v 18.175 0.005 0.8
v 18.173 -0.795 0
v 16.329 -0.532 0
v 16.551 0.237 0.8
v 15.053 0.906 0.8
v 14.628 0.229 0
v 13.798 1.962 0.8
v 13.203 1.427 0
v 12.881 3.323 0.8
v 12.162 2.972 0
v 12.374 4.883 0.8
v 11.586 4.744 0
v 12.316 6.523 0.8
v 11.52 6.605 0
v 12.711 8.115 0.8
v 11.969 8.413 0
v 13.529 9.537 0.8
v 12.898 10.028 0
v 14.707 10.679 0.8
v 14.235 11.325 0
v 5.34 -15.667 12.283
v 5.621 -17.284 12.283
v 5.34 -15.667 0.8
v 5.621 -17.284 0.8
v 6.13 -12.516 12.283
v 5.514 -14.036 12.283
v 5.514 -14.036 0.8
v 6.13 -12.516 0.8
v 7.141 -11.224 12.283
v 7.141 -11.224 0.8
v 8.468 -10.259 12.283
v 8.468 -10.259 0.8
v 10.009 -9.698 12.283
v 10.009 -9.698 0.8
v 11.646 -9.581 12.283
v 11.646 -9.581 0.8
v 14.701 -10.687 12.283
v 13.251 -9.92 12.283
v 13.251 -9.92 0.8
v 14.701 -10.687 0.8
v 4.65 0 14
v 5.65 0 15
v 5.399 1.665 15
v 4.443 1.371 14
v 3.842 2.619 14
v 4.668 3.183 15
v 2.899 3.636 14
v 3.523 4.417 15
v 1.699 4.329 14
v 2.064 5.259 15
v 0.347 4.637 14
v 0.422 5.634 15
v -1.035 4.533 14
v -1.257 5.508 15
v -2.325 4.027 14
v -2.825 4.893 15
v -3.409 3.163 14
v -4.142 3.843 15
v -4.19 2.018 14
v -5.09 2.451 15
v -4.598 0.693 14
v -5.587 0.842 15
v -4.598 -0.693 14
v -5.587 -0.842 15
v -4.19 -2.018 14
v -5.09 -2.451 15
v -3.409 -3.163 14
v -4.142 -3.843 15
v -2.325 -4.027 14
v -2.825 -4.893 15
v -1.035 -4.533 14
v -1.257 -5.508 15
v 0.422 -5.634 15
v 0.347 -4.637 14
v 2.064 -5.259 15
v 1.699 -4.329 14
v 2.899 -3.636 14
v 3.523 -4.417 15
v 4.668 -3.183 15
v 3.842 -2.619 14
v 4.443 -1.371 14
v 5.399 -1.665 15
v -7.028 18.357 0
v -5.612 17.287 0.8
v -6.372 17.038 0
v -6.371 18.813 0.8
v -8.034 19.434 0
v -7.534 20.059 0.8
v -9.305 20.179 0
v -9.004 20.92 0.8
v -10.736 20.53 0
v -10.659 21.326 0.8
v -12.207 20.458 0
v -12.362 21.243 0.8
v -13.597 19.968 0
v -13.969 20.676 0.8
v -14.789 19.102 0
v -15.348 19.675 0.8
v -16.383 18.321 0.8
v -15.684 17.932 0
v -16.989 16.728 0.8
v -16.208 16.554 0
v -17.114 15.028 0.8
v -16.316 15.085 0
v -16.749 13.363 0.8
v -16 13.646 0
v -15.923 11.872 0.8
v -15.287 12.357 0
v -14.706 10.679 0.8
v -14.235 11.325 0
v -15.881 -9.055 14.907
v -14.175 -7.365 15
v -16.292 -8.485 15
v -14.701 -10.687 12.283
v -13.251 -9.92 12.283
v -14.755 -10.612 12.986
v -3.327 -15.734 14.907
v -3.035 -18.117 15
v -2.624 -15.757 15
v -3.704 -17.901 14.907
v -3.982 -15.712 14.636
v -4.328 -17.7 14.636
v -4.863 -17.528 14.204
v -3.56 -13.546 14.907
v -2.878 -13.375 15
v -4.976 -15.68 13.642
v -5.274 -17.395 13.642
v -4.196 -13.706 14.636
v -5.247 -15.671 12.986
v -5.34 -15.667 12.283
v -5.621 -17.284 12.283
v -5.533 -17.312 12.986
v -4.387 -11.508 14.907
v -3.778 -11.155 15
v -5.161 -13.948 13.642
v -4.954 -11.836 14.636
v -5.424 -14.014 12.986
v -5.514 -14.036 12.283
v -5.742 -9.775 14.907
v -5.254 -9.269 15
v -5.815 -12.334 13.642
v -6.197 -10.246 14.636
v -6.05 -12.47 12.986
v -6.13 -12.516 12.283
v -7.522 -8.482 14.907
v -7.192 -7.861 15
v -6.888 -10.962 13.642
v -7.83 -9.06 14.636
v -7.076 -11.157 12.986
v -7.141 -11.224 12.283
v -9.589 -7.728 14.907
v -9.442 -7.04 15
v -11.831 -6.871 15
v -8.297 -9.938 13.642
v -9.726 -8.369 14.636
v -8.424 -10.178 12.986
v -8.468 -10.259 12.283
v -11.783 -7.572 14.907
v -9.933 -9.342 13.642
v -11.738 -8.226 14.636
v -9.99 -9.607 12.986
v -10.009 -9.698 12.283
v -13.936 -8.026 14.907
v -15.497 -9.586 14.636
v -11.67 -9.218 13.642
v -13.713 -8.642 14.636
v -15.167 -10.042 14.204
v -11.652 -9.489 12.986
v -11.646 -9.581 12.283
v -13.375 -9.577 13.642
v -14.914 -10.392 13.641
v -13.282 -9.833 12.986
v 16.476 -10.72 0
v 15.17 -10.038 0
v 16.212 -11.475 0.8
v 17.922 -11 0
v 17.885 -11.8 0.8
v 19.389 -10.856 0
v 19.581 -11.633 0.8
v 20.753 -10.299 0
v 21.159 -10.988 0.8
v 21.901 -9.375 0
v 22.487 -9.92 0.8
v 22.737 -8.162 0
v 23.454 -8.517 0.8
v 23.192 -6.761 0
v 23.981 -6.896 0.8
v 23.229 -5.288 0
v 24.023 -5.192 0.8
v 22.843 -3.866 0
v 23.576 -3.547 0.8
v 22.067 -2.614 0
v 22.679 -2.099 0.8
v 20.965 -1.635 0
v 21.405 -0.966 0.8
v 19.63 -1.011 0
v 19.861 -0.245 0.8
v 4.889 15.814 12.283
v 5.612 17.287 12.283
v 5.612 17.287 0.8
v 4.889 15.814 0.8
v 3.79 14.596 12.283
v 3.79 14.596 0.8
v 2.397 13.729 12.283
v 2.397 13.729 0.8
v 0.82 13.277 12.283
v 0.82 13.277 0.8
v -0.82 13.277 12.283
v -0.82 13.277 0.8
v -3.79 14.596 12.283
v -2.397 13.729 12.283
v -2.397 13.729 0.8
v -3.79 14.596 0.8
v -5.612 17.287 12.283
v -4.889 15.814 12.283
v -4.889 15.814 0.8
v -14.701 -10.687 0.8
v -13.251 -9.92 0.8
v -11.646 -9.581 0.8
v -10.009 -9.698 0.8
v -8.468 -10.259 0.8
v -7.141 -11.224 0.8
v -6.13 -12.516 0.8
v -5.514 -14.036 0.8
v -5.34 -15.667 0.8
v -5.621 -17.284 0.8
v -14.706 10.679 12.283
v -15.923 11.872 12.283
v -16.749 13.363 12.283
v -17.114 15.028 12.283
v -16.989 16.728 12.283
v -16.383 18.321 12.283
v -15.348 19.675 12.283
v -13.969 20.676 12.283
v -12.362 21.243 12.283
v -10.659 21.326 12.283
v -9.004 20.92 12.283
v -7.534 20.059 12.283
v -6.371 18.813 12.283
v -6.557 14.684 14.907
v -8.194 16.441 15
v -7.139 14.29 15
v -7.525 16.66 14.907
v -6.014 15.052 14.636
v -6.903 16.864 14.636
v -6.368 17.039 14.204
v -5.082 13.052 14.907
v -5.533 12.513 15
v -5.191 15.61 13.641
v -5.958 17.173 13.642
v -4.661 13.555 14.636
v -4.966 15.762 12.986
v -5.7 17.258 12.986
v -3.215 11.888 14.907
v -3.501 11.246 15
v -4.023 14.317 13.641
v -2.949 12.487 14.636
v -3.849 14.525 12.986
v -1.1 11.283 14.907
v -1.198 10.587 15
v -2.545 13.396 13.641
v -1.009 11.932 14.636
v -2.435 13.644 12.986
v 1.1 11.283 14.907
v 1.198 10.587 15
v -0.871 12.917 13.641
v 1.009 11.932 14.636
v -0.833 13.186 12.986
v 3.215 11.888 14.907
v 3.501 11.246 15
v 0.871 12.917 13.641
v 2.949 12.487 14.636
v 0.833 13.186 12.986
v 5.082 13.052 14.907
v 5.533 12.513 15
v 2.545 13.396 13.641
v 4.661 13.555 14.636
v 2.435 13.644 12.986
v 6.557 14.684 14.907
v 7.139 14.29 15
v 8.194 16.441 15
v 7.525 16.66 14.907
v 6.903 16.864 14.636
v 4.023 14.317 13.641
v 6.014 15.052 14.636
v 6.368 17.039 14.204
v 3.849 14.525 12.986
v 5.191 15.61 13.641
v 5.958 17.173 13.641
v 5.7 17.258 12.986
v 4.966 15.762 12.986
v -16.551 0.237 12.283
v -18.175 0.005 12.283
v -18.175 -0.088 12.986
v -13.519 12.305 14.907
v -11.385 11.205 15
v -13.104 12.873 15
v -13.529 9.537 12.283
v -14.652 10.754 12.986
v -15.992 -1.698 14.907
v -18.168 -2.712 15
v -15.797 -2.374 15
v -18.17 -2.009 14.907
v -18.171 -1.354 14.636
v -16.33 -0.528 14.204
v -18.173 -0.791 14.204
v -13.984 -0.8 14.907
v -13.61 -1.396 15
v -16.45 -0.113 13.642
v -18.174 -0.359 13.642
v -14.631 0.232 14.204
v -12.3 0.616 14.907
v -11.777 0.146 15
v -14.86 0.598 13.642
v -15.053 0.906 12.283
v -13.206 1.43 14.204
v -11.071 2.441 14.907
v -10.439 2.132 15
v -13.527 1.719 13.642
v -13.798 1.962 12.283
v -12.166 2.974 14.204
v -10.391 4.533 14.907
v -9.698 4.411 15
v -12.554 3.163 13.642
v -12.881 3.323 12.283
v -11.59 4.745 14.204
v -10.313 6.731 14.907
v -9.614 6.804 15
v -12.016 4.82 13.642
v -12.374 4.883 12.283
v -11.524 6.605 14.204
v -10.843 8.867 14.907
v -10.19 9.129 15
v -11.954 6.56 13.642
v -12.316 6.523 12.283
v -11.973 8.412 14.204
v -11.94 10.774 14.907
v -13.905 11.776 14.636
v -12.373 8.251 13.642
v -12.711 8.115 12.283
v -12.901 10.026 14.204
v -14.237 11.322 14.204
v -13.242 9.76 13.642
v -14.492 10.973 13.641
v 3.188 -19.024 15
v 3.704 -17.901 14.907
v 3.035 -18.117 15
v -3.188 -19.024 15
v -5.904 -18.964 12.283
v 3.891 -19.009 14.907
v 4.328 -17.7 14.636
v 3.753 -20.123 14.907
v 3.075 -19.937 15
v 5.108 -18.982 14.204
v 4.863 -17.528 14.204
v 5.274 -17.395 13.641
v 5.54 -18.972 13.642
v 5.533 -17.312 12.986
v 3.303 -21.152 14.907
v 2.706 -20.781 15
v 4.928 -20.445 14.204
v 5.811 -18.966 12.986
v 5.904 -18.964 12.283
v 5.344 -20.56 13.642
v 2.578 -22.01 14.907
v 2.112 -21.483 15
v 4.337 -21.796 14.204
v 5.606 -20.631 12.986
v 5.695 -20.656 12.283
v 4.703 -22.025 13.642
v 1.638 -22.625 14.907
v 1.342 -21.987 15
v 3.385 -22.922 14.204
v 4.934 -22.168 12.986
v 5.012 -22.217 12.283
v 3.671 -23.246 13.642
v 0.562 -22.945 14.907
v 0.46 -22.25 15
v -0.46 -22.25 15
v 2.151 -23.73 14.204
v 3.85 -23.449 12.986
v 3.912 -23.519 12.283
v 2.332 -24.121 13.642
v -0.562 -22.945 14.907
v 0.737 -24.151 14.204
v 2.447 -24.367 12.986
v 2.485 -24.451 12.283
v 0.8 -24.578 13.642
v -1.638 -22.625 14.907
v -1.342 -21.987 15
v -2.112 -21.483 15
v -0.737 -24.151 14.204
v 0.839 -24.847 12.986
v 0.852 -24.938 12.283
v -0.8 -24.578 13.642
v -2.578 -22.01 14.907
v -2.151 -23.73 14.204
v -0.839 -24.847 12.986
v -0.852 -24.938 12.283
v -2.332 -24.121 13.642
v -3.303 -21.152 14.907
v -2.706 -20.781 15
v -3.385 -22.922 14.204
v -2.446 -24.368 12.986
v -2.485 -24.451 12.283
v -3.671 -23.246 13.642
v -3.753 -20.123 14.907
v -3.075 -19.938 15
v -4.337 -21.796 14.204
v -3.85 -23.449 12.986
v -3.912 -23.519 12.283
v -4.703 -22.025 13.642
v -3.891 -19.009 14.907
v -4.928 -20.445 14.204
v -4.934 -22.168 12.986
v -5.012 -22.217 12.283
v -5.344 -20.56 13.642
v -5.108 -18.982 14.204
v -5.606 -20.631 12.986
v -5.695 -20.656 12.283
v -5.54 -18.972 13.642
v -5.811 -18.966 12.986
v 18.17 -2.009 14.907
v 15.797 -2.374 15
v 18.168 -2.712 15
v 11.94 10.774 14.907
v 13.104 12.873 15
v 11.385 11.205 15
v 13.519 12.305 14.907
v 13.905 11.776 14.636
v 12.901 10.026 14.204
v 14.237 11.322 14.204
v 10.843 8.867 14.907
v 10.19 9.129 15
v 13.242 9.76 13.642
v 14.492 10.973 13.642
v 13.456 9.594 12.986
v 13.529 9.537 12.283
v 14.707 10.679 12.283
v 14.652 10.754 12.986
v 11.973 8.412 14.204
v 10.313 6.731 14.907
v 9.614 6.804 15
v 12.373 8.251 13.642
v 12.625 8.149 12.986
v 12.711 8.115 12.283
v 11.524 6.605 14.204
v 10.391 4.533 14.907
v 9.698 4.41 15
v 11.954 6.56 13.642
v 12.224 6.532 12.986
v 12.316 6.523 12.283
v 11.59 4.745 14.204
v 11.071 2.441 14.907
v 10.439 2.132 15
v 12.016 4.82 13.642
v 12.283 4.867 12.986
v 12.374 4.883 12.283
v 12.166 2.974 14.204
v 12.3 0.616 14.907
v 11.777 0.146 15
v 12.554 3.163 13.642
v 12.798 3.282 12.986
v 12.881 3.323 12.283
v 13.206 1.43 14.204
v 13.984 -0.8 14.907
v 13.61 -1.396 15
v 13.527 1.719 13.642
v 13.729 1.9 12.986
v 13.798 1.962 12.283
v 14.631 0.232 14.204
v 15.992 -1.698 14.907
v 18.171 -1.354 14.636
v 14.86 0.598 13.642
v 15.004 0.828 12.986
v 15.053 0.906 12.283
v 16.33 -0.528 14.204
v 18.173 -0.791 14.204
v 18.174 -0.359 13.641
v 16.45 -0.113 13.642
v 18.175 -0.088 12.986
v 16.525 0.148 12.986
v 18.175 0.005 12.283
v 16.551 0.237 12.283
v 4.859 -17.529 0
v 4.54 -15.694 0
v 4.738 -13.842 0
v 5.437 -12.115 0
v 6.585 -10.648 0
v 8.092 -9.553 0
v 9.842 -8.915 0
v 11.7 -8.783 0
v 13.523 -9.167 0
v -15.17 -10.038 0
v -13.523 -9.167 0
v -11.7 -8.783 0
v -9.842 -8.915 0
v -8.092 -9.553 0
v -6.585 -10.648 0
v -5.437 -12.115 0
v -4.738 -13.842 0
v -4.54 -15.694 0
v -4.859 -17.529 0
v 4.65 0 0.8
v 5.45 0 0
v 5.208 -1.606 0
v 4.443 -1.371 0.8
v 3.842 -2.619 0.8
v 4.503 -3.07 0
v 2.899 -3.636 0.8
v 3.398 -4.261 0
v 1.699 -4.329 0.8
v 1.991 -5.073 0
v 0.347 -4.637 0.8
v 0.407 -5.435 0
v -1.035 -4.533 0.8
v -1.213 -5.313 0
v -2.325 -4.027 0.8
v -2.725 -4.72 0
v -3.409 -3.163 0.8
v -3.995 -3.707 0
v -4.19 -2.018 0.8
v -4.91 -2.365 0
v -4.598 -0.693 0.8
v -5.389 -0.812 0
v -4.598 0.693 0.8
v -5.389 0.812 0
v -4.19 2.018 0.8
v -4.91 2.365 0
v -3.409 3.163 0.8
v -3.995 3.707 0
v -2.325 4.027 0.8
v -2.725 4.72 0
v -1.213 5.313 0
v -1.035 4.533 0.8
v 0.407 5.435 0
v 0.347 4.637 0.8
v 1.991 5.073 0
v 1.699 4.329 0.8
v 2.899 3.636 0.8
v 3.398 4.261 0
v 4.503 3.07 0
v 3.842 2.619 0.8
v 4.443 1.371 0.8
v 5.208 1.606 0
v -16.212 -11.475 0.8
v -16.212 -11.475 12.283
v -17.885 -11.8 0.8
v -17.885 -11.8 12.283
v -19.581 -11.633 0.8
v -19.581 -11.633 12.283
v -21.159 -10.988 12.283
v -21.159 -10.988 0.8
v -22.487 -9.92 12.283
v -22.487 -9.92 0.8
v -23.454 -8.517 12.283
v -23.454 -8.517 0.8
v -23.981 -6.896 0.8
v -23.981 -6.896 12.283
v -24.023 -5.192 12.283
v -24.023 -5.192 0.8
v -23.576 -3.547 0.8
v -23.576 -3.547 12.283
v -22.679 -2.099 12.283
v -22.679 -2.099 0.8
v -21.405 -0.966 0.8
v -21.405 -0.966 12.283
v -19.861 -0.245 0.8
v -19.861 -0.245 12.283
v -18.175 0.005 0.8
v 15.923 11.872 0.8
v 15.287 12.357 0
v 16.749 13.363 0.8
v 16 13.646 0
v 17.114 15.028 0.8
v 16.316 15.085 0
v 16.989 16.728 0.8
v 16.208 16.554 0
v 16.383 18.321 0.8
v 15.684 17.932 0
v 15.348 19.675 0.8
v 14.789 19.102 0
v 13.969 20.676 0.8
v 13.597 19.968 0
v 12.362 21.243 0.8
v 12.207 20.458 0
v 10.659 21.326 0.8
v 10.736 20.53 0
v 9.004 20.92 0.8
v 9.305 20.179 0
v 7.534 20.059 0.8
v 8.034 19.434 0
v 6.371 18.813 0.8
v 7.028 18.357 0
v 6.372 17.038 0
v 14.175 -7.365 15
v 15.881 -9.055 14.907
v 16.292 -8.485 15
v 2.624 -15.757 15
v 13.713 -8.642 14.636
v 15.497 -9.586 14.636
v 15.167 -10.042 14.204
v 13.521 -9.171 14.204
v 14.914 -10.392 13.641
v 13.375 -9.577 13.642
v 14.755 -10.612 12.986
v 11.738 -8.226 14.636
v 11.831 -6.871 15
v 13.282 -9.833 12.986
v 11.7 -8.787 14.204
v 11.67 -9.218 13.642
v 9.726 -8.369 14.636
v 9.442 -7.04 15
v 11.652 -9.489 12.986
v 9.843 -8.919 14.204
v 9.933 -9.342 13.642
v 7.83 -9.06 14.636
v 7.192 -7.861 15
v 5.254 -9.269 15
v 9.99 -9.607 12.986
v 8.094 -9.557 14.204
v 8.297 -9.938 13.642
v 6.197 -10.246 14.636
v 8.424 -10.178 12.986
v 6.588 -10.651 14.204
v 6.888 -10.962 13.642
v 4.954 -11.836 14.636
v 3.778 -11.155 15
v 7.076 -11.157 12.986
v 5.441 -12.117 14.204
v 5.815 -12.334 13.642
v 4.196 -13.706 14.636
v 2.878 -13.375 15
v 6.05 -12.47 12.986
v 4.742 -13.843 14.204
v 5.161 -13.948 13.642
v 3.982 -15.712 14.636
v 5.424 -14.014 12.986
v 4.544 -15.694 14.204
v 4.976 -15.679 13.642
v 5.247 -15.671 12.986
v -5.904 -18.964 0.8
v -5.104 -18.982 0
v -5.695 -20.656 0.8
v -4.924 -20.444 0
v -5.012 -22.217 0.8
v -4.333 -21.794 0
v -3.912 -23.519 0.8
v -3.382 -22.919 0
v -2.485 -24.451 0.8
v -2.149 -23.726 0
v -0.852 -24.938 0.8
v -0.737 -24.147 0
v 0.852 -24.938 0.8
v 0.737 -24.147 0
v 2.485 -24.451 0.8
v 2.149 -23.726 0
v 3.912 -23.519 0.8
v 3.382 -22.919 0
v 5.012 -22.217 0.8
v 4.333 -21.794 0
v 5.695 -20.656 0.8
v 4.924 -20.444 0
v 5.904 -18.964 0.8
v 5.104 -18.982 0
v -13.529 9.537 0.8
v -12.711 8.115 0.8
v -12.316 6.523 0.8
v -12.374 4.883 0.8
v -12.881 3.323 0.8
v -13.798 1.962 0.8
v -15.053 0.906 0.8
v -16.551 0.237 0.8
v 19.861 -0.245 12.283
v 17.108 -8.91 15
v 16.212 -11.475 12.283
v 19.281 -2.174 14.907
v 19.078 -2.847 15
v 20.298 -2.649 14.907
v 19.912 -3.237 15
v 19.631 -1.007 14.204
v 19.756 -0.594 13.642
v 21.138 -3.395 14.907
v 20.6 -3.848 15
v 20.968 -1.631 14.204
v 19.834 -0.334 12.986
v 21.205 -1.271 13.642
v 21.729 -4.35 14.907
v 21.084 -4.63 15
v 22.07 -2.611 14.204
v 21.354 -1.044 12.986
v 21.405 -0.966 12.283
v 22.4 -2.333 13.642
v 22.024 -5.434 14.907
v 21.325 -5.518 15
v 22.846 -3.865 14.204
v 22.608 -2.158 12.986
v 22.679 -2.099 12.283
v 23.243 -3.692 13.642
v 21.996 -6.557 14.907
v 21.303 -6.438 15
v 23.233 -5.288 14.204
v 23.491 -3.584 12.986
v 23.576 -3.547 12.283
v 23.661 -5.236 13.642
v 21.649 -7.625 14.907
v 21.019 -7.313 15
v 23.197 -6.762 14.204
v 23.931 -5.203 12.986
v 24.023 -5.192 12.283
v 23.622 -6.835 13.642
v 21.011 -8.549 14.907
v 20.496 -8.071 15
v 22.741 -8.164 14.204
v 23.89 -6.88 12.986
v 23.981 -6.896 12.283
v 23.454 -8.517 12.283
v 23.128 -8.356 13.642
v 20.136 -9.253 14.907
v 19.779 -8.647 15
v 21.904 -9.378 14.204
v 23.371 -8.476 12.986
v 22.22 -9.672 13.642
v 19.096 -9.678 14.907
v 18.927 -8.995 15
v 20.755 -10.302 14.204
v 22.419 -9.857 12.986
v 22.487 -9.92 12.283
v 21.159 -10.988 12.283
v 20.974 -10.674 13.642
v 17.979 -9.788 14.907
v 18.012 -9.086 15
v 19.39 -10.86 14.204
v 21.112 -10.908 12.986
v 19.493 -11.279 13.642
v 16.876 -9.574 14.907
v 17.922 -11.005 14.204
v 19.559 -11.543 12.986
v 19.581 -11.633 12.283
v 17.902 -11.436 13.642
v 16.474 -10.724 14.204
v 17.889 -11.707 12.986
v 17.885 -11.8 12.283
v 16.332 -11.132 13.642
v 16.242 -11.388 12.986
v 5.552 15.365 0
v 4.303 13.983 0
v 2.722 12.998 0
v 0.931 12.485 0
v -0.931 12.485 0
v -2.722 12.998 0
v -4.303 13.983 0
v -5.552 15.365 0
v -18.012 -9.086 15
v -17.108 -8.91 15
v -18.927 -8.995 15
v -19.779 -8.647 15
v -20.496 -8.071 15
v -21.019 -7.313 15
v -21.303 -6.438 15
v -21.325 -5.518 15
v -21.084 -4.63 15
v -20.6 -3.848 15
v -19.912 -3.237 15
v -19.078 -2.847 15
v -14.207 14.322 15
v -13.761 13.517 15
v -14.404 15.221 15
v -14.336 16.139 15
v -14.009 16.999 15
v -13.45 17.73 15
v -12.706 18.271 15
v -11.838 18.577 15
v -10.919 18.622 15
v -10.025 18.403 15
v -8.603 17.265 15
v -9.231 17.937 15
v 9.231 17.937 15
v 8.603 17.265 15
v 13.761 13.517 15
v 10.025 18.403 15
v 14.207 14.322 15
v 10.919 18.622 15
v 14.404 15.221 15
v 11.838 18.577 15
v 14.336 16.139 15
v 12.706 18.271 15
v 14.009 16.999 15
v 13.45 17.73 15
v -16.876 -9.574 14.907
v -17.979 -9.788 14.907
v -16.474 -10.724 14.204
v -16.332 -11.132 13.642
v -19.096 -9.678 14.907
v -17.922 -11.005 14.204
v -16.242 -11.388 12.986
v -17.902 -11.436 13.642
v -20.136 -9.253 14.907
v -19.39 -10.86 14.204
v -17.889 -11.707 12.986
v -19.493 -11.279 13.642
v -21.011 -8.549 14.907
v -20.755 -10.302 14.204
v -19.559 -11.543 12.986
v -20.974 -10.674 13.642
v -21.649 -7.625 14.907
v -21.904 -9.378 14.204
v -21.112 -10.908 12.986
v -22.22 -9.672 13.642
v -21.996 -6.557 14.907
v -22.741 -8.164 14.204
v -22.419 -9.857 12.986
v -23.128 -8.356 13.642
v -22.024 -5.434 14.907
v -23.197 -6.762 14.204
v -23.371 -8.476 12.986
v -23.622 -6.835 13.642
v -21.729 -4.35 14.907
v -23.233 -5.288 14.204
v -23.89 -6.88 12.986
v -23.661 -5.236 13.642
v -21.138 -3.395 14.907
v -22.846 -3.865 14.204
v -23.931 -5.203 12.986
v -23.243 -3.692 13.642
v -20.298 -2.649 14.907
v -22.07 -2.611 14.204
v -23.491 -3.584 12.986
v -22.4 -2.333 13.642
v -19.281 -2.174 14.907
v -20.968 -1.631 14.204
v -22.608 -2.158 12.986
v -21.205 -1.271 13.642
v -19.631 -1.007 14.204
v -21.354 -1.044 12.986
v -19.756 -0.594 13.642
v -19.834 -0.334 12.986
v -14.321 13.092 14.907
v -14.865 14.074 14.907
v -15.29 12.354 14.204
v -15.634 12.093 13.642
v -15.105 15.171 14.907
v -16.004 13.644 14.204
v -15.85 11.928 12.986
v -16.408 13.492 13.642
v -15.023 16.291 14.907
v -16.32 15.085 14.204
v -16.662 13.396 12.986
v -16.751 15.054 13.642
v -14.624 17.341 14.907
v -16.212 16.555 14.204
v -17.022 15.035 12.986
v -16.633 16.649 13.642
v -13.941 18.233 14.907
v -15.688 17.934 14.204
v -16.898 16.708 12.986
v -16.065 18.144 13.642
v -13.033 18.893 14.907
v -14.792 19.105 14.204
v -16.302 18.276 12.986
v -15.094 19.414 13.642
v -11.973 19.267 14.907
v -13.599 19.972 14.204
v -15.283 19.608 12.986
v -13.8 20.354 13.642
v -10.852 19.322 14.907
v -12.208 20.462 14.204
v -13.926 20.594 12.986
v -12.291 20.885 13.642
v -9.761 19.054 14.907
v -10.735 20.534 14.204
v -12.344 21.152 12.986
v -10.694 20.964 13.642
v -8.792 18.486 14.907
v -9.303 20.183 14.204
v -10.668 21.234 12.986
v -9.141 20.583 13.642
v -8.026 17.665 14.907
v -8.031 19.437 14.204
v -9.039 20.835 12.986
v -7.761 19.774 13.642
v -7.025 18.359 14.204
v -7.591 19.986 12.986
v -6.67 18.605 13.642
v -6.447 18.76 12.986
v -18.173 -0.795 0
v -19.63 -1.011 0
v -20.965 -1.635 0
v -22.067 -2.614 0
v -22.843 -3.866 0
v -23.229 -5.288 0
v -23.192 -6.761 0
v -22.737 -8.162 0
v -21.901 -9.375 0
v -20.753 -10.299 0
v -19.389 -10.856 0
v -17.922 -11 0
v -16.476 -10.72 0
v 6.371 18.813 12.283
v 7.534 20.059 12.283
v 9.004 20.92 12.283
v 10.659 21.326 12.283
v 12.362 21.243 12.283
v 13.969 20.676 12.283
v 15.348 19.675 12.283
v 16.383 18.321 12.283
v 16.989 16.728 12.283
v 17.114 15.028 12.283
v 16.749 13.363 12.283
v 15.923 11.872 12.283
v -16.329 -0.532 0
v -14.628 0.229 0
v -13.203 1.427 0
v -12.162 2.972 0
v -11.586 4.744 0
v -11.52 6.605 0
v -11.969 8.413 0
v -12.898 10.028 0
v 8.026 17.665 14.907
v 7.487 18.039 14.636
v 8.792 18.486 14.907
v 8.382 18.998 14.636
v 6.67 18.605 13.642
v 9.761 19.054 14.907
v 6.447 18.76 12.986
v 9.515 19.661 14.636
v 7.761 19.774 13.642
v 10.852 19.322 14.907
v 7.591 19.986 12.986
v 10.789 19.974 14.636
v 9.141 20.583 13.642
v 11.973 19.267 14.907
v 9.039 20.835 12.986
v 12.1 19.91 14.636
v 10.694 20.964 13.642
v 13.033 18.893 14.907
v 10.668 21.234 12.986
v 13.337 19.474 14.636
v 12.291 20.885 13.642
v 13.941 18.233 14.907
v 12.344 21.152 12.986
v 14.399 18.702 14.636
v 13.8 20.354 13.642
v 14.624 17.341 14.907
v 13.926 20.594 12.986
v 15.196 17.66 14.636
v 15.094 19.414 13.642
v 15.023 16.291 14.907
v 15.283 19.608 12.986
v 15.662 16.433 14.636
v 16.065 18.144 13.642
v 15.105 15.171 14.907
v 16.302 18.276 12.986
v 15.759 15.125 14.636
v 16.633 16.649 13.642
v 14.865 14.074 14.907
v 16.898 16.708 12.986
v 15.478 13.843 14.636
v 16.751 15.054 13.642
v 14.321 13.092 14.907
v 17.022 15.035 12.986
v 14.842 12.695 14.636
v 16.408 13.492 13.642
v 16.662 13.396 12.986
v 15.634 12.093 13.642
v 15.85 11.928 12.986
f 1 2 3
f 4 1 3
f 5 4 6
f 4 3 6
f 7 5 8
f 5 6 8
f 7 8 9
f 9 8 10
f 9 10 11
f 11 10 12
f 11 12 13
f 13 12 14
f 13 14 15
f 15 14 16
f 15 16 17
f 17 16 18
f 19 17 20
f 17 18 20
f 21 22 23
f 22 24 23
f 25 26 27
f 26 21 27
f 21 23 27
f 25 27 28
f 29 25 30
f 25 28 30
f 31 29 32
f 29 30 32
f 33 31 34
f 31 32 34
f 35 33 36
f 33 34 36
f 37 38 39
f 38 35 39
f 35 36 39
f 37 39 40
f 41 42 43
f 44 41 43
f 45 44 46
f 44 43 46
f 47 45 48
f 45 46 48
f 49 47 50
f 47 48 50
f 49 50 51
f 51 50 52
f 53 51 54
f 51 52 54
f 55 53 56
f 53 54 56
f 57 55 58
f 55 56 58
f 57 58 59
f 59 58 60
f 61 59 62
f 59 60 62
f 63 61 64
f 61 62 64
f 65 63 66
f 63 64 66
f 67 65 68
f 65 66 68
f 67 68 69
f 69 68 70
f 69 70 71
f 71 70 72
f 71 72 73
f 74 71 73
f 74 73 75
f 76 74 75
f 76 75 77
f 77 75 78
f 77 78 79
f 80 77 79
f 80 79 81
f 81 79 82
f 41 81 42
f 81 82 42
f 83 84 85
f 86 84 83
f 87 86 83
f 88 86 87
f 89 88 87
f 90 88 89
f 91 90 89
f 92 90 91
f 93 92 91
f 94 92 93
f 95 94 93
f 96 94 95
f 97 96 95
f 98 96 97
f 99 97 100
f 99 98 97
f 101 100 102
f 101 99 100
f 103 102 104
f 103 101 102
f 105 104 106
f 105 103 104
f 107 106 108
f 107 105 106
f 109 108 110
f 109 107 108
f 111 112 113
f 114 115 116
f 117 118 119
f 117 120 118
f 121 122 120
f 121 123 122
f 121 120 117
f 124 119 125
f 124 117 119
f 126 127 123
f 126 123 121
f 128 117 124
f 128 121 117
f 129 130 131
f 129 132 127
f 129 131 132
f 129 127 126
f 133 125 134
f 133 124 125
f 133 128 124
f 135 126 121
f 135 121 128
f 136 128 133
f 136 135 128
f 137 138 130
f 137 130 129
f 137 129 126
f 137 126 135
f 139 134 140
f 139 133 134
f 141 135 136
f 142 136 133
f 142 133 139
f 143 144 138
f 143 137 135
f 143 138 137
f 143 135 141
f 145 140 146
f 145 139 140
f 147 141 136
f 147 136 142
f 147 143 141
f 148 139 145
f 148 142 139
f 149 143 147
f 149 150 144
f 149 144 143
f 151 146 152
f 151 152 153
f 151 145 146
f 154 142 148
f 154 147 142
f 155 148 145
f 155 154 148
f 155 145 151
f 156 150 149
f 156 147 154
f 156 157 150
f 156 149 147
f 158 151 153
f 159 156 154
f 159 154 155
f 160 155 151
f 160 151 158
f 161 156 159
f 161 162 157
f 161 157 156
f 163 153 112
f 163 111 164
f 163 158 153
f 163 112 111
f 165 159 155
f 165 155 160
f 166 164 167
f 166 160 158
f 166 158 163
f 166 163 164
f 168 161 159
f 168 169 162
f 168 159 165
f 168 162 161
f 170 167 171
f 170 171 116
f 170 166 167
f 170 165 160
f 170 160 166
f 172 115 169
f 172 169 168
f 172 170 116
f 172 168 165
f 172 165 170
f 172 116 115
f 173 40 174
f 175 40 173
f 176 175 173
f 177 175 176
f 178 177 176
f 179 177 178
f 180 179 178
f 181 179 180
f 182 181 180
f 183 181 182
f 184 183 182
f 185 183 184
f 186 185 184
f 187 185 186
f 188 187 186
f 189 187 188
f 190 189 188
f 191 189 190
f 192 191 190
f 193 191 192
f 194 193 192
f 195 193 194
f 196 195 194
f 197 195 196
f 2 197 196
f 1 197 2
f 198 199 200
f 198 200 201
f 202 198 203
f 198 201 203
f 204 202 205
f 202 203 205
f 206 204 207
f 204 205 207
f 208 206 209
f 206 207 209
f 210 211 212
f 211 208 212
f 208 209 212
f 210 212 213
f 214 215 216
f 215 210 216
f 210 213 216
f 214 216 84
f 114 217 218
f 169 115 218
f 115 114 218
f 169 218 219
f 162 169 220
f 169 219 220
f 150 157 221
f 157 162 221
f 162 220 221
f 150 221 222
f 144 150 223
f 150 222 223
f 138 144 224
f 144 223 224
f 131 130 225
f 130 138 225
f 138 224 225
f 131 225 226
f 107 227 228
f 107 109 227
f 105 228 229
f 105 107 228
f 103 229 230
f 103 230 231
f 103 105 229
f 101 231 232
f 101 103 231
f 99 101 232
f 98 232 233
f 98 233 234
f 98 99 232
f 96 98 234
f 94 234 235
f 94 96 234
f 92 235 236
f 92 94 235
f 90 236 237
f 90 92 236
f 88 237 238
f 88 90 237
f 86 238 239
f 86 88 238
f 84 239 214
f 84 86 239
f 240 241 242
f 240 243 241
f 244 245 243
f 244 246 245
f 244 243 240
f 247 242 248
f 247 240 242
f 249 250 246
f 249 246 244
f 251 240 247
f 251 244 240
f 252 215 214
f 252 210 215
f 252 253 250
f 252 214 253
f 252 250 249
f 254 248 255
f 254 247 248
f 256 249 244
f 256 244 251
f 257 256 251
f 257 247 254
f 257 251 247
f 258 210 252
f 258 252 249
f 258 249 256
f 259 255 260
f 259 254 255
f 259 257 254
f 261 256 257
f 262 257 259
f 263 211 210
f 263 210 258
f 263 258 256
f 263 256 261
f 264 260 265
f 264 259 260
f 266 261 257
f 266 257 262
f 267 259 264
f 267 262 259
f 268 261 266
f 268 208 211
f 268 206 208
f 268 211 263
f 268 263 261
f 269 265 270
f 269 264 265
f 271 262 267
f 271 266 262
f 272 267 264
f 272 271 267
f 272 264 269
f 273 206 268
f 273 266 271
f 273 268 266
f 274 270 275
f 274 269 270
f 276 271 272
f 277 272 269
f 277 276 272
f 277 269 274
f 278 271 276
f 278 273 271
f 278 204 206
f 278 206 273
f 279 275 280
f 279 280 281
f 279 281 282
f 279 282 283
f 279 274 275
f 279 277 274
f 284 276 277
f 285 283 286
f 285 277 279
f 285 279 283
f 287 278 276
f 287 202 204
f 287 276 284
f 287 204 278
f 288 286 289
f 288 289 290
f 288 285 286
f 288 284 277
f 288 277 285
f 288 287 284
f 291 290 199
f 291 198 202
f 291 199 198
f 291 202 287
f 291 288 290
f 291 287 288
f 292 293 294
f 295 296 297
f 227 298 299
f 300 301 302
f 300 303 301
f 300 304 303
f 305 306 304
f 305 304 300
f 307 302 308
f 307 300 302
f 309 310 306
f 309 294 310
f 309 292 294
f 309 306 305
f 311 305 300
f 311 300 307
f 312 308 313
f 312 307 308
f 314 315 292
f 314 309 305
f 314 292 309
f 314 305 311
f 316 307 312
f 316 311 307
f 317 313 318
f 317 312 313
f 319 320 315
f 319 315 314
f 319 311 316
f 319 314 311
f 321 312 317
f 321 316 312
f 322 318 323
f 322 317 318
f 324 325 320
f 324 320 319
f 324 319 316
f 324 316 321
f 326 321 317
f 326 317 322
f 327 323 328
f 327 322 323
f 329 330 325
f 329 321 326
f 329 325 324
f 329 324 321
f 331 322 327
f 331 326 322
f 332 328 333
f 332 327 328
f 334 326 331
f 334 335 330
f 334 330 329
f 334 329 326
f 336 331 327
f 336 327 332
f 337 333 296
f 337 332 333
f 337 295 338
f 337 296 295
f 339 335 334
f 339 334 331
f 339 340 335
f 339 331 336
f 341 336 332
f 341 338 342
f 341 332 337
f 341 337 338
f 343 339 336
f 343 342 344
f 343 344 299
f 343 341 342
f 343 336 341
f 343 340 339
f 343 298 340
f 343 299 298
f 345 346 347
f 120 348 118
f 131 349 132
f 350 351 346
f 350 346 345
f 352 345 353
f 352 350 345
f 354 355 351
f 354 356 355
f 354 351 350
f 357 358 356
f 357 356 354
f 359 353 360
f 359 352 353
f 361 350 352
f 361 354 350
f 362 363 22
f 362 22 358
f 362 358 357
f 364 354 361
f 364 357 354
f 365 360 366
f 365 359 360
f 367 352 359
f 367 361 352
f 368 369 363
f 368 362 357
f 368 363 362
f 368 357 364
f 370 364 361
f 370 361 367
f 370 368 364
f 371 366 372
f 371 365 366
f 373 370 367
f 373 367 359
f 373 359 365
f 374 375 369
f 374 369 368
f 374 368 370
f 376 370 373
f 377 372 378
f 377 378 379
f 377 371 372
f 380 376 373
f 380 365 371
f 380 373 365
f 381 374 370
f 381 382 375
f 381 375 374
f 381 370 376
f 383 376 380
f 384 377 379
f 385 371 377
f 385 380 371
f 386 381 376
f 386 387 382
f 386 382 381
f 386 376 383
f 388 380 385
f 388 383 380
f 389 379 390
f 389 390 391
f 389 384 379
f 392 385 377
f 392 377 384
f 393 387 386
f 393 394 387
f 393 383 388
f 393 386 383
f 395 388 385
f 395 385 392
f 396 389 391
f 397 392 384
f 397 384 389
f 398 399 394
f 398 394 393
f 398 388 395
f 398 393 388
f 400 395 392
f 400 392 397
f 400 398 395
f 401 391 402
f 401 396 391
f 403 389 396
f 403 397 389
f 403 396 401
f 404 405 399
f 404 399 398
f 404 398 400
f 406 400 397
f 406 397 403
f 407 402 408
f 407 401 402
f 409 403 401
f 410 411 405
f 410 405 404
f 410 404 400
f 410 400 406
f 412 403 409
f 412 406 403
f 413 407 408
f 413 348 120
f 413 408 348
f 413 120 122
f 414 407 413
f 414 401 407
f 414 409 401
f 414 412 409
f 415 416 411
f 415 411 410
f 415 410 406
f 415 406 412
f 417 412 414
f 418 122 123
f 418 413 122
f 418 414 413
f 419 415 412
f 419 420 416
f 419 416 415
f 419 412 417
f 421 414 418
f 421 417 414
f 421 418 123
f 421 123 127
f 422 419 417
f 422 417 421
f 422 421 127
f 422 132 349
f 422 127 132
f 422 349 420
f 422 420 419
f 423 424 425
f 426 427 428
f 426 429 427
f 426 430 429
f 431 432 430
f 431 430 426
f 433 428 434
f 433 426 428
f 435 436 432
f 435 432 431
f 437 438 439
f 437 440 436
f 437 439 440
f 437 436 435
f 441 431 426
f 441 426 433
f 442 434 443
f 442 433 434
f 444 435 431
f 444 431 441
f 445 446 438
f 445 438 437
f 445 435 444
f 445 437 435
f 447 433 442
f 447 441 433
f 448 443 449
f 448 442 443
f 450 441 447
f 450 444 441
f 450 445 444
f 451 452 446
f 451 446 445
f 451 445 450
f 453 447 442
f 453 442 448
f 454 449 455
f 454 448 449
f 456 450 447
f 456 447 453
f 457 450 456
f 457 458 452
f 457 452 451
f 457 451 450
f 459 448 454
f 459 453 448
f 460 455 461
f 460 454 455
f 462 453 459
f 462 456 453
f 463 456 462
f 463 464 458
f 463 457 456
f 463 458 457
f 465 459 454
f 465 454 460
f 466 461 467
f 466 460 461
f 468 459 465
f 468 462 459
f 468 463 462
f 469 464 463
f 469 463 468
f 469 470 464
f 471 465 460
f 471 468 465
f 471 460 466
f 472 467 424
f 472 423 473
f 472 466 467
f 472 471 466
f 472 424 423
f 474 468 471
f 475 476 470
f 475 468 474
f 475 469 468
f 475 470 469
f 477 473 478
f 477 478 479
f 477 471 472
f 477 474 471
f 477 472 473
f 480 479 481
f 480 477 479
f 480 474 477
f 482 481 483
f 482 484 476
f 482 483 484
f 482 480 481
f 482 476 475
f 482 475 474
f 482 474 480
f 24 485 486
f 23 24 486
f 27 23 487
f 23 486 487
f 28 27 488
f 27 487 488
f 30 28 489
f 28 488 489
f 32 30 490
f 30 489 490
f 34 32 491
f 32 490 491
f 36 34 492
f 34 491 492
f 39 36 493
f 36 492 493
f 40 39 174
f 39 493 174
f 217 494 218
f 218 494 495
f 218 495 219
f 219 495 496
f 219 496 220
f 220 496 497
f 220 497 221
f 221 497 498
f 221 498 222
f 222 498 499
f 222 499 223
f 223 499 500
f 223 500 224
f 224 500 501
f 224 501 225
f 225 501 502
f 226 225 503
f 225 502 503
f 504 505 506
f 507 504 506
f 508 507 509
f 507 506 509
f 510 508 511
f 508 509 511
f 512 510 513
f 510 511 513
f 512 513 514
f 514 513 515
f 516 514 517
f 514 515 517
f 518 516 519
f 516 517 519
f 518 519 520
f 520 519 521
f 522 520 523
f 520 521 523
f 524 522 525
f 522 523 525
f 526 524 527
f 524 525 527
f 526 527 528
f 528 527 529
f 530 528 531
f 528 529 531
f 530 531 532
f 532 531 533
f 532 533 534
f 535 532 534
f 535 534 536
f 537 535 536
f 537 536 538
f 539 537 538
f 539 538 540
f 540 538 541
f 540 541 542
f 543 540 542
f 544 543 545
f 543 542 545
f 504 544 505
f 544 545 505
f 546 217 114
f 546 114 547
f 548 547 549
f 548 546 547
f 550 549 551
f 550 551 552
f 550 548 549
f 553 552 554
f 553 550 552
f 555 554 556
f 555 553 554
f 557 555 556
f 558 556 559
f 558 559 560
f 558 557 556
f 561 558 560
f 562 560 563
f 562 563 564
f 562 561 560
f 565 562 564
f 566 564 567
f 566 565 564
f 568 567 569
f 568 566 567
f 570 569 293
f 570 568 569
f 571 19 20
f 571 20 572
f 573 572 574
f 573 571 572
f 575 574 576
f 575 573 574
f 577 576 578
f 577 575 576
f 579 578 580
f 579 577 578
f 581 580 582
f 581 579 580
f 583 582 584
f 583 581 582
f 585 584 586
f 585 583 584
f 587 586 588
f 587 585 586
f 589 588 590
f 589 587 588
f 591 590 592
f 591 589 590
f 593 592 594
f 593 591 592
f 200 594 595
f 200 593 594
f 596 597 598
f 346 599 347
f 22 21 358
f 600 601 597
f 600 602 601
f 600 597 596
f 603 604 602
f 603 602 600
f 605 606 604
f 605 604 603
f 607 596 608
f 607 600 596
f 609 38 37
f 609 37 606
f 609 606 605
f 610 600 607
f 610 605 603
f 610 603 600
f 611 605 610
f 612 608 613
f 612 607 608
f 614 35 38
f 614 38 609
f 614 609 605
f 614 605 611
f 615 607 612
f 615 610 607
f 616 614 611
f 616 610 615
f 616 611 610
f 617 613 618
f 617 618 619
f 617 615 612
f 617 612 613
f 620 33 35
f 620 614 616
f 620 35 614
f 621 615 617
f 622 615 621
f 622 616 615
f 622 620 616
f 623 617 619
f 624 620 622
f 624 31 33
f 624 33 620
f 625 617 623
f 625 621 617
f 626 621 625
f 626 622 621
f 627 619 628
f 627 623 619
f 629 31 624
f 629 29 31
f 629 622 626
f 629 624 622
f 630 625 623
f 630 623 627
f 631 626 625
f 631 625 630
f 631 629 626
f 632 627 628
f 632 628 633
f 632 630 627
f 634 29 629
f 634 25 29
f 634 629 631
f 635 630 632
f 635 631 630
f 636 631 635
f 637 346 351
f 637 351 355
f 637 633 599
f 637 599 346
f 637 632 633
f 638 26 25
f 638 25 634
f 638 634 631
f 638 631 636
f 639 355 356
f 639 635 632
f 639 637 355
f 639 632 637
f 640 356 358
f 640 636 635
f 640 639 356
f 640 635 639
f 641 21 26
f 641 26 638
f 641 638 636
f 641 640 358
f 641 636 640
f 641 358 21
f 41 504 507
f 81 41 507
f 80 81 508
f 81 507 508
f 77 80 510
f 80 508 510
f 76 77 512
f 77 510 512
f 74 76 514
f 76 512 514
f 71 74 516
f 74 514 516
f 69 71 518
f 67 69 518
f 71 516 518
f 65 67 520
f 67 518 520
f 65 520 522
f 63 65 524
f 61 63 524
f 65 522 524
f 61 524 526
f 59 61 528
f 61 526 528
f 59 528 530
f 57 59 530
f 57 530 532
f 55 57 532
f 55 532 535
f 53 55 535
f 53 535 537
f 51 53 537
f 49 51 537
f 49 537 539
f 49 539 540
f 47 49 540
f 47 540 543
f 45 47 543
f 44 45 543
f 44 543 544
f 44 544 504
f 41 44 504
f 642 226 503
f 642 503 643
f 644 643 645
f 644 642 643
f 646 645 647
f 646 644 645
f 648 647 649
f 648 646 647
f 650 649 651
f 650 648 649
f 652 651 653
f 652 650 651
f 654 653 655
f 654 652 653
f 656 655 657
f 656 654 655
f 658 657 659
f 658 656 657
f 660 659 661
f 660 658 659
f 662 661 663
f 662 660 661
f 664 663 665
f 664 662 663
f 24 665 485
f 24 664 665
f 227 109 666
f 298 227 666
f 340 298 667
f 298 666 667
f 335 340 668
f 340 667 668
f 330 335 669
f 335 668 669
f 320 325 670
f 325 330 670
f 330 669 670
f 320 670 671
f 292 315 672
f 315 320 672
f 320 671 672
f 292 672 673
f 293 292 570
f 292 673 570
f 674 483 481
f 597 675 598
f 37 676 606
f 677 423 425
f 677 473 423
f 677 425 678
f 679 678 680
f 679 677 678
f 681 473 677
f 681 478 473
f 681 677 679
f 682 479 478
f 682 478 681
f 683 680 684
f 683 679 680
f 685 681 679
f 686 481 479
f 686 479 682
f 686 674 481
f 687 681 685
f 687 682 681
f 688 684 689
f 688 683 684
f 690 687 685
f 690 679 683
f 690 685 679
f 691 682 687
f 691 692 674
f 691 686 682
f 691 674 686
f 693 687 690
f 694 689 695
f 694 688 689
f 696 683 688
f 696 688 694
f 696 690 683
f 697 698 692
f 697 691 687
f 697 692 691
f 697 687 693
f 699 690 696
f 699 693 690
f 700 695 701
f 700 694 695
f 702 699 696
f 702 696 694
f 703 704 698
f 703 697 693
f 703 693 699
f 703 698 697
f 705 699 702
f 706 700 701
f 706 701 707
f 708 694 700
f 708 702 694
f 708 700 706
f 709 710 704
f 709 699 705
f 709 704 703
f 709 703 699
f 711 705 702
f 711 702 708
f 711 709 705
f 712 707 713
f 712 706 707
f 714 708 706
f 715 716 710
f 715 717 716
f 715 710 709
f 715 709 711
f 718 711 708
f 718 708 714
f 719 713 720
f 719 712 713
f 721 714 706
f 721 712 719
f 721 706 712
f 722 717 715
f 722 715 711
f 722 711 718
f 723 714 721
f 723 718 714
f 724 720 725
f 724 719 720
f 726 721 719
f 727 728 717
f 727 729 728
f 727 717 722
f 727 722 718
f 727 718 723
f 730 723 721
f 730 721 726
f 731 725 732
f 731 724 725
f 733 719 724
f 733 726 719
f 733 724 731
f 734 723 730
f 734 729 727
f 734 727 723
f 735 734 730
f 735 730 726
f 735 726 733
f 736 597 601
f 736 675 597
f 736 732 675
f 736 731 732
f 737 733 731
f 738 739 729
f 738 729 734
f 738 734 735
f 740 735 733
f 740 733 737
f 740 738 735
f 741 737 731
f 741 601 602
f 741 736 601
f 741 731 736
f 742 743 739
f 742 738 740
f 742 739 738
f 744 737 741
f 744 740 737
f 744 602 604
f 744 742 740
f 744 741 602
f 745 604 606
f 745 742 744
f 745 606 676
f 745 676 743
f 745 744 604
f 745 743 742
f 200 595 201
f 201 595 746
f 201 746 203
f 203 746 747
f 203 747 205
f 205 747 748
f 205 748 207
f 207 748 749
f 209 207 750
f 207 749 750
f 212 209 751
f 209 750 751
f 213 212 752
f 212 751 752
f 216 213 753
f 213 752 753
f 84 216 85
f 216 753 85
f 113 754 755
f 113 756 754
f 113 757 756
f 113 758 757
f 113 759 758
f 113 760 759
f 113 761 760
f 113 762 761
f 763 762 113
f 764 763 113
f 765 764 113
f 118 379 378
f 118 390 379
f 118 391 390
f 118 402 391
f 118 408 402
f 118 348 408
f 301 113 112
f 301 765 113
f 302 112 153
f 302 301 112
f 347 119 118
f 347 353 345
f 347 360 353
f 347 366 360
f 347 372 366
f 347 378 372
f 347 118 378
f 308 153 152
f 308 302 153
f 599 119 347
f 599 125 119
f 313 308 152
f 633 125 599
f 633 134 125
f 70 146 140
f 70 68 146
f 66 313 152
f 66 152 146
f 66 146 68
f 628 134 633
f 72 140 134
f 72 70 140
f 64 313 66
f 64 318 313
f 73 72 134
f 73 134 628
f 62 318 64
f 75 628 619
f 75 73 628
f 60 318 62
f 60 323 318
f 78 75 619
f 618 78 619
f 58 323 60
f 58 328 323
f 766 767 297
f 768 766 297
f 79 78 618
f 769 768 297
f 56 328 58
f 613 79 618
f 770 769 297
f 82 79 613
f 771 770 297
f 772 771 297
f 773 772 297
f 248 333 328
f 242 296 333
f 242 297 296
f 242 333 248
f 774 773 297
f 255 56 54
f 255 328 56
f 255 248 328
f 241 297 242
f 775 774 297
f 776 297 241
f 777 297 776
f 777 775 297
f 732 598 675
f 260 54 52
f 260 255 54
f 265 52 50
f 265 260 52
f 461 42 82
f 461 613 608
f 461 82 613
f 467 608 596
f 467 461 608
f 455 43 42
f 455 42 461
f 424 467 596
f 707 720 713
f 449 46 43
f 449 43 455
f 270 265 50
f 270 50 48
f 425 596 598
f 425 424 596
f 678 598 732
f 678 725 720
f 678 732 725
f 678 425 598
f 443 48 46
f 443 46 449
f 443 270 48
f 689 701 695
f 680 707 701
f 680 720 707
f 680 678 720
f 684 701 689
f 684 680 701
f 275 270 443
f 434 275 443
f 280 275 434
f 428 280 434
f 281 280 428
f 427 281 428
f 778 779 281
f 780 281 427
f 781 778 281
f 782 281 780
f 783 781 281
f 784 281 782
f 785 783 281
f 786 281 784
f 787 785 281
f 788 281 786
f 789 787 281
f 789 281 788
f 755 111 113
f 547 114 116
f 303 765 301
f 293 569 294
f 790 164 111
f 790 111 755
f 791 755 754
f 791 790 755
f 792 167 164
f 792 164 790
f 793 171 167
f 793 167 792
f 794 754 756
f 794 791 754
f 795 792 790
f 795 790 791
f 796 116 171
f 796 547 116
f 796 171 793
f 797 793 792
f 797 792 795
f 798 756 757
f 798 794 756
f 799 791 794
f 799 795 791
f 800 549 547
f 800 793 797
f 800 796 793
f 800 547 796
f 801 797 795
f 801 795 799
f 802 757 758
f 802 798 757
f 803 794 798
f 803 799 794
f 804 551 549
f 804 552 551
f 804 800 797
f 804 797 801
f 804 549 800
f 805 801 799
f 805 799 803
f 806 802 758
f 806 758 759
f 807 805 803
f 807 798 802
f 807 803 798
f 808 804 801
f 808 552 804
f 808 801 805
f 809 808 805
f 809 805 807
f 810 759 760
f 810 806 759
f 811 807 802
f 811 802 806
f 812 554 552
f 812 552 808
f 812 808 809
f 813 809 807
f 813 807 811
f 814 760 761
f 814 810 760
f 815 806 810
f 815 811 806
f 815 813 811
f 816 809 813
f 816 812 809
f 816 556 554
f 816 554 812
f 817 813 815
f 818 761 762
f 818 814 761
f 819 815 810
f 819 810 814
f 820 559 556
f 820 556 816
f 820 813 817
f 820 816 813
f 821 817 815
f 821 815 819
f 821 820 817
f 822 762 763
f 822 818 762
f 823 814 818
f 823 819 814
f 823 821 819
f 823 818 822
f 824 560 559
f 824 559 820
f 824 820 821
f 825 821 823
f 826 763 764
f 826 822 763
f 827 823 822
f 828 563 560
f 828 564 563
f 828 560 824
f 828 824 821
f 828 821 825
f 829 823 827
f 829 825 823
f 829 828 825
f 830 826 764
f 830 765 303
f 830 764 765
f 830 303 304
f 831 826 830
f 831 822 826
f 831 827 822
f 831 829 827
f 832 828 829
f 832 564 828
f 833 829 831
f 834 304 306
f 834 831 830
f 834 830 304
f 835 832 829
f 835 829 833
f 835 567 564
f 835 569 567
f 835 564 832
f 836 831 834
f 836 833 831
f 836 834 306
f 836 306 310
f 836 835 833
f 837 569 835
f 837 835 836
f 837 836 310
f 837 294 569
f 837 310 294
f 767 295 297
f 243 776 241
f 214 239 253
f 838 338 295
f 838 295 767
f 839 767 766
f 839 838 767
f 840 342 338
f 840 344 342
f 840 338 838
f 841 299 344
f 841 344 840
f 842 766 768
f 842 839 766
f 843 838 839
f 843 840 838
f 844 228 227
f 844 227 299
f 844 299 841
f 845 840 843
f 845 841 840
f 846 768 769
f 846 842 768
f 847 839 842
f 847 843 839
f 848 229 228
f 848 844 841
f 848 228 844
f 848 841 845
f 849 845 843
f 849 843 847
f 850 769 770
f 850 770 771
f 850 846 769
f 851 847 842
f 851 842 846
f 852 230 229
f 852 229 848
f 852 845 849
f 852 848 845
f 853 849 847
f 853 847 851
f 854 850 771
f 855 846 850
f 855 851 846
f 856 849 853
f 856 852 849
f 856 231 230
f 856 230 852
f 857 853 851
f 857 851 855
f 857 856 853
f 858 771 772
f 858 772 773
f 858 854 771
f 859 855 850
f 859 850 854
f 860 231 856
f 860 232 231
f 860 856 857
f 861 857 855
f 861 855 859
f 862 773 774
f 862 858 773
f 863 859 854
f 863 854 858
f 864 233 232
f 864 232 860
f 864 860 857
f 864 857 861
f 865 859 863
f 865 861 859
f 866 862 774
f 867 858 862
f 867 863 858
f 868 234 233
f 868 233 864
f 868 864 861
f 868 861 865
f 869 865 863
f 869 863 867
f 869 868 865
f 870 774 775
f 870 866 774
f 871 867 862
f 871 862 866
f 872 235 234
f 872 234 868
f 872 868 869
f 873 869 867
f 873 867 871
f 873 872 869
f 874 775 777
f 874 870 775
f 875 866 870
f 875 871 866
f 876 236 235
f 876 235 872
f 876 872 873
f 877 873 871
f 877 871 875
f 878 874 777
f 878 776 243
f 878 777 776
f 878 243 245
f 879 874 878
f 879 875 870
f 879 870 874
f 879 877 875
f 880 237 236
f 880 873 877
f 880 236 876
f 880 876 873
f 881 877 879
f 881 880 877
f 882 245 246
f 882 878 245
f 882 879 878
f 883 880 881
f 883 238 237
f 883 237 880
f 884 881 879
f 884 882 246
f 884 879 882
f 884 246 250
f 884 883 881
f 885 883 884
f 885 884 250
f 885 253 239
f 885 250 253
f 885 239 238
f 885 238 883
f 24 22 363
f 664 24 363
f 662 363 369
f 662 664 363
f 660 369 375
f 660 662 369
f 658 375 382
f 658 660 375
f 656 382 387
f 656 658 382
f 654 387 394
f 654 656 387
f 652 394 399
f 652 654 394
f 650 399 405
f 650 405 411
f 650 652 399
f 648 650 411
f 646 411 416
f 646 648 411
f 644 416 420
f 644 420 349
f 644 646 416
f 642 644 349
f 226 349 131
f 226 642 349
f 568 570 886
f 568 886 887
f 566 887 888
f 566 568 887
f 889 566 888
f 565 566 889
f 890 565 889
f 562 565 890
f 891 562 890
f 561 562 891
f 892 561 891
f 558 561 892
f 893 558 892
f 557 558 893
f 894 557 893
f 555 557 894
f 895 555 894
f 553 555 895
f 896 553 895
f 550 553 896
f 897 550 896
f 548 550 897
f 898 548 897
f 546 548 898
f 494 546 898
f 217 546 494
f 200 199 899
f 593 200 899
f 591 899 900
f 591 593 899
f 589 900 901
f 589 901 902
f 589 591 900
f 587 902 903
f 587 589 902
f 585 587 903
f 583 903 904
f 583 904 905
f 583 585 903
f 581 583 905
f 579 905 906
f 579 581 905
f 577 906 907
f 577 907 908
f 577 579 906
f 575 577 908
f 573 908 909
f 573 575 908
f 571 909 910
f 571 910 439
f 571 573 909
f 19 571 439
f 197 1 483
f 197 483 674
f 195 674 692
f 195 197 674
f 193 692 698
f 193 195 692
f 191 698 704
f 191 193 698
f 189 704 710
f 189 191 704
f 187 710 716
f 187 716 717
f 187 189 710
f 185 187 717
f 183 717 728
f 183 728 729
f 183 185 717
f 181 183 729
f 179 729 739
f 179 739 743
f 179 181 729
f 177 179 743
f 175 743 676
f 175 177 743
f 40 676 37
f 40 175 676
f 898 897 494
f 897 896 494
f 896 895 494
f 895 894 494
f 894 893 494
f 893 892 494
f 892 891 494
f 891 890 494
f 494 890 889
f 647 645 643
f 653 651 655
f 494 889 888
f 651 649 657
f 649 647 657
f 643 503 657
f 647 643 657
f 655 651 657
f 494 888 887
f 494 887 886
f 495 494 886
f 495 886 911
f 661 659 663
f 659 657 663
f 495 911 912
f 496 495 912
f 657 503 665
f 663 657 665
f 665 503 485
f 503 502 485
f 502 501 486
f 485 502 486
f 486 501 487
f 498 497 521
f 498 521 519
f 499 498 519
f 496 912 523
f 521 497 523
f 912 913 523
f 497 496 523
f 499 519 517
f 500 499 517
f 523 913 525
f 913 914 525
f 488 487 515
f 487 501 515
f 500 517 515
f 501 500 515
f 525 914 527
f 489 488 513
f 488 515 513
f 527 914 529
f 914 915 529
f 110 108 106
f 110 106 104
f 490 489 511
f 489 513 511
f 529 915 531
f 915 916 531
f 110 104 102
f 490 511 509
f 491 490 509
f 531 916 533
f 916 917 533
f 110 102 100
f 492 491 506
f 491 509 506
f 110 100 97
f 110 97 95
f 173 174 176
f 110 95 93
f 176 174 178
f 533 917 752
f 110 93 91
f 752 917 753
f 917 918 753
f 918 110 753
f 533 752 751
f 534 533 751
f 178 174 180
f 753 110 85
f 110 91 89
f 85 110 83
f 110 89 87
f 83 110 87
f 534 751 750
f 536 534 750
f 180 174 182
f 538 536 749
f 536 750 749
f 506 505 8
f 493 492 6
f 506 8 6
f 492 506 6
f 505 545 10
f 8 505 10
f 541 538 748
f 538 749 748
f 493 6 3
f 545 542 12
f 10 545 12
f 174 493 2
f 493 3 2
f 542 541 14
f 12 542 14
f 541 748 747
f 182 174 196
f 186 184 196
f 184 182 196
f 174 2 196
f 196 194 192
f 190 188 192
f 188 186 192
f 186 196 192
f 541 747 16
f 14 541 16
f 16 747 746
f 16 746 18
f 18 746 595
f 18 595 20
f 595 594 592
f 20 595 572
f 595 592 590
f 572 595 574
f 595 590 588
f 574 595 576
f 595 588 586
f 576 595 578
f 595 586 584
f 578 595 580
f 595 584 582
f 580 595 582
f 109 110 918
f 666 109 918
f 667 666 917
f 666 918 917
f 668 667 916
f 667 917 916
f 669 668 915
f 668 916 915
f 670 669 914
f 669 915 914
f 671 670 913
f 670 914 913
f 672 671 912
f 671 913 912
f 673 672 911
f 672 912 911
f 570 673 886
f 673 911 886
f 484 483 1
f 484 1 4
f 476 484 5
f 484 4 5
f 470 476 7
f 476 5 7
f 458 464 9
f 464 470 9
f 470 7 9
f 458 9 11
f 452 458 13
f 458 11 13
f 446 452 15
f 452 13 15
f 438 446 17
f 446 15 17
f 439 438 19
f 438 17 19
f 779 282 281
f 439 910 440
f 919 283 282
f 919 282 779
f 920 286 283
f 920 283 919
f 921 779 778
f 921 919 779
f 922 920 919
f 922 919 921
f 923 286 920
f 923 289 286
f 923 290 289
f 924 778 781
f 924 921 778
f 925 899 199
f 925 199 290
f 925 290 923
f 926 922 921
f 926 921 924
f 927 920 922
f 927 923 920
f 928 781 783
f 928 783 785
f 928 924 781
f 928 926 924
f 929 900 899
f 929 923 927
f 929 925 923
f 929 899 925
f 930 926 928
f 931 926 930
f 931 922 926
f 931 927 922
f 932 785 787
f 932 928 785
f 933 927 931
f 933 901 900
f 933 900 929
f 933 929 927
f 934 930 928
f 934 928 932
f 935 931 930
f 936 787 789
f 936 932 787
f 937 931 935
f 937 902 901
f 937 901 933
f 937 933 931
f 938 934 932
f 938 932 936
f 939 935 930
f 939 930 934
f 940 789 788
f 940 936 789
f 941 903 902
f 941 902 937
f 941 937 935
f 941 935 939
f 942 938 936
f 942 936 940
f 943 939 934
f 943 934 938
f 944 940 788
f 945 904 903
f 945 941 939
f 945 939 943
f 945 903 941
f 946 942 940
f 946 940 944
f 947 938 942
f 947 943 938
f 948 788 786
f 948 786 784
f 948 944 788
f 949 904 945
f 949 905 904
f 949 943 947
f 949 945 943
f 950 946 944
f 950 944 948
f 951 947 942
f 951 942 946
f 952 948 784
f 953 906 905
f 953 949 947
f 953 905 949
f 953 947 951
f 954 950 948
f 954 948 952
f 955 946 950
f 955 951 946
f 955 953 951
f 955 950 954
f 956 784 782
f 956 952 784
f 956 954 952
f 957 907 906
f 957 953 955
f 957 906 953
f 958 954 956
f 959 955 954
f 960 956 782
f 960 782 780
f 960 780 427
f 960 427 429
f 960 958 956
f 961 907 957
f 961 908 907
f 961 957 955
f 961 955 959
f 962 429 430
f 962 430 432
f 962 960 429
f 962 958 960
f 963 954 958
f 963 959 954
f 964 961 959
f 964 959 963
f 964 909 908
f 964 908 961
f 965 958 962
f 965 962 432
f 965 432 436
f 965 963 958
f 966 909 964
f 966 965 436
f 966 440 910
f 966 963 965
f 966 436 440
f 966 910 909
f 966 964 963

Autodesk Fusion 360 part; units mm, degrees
sketch "Sketch1" plane through (0, 0, 0) normal (0, 0, 1) x (1, 0, 0)
  circle A0 centre (0, 0) radius 31.6631 construction
  circle A1 centre (0, 31.6631) radius 21.7092 construction
  circle A2 centre (27.4211, -15.8316) radius 21.7092 construction
  circle A3 centre (-27.4211, -15.8316) radius 21.7092 construction
  line L0 (0, 0) -> (0, 31.6631) construction
  line L1 (0, 0) -> (27.4211, -15.8316) construction
  line L2 (0, 0) -> (-27.4211, -15.8316) construction
  circle A4 centre (2.3751, -0.3675) radius 18.8772 construction
  circle A5 centre (0, -19.0946) radius 5.9054
  circle A6 centre (0, 0) radius 25 construction
  circle A7 centre (0, 0) radius 4.65
  line L3 (0, 0) -> (0, -19.0946) construction
  line L4 (0, 0) -> (-16.4545, 9.5) construction
  line L5 (0, 0) -> (6.5253, -3.7674)
  circle A8 centre (18.1601, -5.9006) radius 5.9054
  circle A9 centre (11.2236, 15.4479) radius 5.9054
  circle A10 centre (-11.2236, 15.4479) radius 5.9054
  circle A11 centre (-18.1601, -5.9006) radius 5.9054
  arc A12 (14.7009, -10.6867) -> (5.6208, -17.2837) centre (11.2417, -15.4728) ccw
  arc A13 (14.7065, 10.679) -> (18.1748, 0.0048) centre (18.1894, 5.9101) ccw
  arc A14 (-5.6118, 17.2867) -> (5.6118, 17.2867) centre (0, 19.1255) ccw
  arc A15 (-18.1748, 0.0048) -> (-14.7065, 10.679) centre (-18.1894, 5.9101) ccw
  arc A16 (-5.6208, -17.2837) -> (-14.7009, -10.6867) centre (-11.2417, -15.4728) ccw
  dimension "d1" = 120
  dimension "d4" = 50
  dimension "d6" = 9.3
  dimension "d21" = 50
  dimension "d22" = 360
  dimension "d23" = 50
  dimension "d24" = 360
extrude "Extrude1" add sketch "Sketch1" along normal blind 15
fillet "Fillet1" radius 2.717 10 edges at (7.7706, -10.6953, 15) (23.7764, -7.7254, 15) (12.5731, 4.0852, 15) (14.6946, 20.2254, 15) (0, 13.2201, 15) (-14.6946, 20.2254, 15) (-12.5731, 4.0852, 15) (-23.7764, -7.7254, 15) (-7.7706, -10.6953, 15) (0, -25, 15)
chamfer "Chamfer3" distance 0.8 angle 45 11 edges at (7.7706, -10.6953, 0) (23.7764, -7.7254, 0) (12.5731, 4.0852, 0) (14.6946, 20.2254, 0) (0, 13.2201, 0) (-14.6946, 20.2254, 0) (-12.5731, 4.0852, 0) (-23.7764, -7.7254, 0) (-7.7706, -10.6953, 0) (0, -25, 0) (-4.3353, 1.6815, 0)
chamfer "Chamfer4" distance 1 angle 45 1 edges at (-4.3353, 1.6815, 15)
